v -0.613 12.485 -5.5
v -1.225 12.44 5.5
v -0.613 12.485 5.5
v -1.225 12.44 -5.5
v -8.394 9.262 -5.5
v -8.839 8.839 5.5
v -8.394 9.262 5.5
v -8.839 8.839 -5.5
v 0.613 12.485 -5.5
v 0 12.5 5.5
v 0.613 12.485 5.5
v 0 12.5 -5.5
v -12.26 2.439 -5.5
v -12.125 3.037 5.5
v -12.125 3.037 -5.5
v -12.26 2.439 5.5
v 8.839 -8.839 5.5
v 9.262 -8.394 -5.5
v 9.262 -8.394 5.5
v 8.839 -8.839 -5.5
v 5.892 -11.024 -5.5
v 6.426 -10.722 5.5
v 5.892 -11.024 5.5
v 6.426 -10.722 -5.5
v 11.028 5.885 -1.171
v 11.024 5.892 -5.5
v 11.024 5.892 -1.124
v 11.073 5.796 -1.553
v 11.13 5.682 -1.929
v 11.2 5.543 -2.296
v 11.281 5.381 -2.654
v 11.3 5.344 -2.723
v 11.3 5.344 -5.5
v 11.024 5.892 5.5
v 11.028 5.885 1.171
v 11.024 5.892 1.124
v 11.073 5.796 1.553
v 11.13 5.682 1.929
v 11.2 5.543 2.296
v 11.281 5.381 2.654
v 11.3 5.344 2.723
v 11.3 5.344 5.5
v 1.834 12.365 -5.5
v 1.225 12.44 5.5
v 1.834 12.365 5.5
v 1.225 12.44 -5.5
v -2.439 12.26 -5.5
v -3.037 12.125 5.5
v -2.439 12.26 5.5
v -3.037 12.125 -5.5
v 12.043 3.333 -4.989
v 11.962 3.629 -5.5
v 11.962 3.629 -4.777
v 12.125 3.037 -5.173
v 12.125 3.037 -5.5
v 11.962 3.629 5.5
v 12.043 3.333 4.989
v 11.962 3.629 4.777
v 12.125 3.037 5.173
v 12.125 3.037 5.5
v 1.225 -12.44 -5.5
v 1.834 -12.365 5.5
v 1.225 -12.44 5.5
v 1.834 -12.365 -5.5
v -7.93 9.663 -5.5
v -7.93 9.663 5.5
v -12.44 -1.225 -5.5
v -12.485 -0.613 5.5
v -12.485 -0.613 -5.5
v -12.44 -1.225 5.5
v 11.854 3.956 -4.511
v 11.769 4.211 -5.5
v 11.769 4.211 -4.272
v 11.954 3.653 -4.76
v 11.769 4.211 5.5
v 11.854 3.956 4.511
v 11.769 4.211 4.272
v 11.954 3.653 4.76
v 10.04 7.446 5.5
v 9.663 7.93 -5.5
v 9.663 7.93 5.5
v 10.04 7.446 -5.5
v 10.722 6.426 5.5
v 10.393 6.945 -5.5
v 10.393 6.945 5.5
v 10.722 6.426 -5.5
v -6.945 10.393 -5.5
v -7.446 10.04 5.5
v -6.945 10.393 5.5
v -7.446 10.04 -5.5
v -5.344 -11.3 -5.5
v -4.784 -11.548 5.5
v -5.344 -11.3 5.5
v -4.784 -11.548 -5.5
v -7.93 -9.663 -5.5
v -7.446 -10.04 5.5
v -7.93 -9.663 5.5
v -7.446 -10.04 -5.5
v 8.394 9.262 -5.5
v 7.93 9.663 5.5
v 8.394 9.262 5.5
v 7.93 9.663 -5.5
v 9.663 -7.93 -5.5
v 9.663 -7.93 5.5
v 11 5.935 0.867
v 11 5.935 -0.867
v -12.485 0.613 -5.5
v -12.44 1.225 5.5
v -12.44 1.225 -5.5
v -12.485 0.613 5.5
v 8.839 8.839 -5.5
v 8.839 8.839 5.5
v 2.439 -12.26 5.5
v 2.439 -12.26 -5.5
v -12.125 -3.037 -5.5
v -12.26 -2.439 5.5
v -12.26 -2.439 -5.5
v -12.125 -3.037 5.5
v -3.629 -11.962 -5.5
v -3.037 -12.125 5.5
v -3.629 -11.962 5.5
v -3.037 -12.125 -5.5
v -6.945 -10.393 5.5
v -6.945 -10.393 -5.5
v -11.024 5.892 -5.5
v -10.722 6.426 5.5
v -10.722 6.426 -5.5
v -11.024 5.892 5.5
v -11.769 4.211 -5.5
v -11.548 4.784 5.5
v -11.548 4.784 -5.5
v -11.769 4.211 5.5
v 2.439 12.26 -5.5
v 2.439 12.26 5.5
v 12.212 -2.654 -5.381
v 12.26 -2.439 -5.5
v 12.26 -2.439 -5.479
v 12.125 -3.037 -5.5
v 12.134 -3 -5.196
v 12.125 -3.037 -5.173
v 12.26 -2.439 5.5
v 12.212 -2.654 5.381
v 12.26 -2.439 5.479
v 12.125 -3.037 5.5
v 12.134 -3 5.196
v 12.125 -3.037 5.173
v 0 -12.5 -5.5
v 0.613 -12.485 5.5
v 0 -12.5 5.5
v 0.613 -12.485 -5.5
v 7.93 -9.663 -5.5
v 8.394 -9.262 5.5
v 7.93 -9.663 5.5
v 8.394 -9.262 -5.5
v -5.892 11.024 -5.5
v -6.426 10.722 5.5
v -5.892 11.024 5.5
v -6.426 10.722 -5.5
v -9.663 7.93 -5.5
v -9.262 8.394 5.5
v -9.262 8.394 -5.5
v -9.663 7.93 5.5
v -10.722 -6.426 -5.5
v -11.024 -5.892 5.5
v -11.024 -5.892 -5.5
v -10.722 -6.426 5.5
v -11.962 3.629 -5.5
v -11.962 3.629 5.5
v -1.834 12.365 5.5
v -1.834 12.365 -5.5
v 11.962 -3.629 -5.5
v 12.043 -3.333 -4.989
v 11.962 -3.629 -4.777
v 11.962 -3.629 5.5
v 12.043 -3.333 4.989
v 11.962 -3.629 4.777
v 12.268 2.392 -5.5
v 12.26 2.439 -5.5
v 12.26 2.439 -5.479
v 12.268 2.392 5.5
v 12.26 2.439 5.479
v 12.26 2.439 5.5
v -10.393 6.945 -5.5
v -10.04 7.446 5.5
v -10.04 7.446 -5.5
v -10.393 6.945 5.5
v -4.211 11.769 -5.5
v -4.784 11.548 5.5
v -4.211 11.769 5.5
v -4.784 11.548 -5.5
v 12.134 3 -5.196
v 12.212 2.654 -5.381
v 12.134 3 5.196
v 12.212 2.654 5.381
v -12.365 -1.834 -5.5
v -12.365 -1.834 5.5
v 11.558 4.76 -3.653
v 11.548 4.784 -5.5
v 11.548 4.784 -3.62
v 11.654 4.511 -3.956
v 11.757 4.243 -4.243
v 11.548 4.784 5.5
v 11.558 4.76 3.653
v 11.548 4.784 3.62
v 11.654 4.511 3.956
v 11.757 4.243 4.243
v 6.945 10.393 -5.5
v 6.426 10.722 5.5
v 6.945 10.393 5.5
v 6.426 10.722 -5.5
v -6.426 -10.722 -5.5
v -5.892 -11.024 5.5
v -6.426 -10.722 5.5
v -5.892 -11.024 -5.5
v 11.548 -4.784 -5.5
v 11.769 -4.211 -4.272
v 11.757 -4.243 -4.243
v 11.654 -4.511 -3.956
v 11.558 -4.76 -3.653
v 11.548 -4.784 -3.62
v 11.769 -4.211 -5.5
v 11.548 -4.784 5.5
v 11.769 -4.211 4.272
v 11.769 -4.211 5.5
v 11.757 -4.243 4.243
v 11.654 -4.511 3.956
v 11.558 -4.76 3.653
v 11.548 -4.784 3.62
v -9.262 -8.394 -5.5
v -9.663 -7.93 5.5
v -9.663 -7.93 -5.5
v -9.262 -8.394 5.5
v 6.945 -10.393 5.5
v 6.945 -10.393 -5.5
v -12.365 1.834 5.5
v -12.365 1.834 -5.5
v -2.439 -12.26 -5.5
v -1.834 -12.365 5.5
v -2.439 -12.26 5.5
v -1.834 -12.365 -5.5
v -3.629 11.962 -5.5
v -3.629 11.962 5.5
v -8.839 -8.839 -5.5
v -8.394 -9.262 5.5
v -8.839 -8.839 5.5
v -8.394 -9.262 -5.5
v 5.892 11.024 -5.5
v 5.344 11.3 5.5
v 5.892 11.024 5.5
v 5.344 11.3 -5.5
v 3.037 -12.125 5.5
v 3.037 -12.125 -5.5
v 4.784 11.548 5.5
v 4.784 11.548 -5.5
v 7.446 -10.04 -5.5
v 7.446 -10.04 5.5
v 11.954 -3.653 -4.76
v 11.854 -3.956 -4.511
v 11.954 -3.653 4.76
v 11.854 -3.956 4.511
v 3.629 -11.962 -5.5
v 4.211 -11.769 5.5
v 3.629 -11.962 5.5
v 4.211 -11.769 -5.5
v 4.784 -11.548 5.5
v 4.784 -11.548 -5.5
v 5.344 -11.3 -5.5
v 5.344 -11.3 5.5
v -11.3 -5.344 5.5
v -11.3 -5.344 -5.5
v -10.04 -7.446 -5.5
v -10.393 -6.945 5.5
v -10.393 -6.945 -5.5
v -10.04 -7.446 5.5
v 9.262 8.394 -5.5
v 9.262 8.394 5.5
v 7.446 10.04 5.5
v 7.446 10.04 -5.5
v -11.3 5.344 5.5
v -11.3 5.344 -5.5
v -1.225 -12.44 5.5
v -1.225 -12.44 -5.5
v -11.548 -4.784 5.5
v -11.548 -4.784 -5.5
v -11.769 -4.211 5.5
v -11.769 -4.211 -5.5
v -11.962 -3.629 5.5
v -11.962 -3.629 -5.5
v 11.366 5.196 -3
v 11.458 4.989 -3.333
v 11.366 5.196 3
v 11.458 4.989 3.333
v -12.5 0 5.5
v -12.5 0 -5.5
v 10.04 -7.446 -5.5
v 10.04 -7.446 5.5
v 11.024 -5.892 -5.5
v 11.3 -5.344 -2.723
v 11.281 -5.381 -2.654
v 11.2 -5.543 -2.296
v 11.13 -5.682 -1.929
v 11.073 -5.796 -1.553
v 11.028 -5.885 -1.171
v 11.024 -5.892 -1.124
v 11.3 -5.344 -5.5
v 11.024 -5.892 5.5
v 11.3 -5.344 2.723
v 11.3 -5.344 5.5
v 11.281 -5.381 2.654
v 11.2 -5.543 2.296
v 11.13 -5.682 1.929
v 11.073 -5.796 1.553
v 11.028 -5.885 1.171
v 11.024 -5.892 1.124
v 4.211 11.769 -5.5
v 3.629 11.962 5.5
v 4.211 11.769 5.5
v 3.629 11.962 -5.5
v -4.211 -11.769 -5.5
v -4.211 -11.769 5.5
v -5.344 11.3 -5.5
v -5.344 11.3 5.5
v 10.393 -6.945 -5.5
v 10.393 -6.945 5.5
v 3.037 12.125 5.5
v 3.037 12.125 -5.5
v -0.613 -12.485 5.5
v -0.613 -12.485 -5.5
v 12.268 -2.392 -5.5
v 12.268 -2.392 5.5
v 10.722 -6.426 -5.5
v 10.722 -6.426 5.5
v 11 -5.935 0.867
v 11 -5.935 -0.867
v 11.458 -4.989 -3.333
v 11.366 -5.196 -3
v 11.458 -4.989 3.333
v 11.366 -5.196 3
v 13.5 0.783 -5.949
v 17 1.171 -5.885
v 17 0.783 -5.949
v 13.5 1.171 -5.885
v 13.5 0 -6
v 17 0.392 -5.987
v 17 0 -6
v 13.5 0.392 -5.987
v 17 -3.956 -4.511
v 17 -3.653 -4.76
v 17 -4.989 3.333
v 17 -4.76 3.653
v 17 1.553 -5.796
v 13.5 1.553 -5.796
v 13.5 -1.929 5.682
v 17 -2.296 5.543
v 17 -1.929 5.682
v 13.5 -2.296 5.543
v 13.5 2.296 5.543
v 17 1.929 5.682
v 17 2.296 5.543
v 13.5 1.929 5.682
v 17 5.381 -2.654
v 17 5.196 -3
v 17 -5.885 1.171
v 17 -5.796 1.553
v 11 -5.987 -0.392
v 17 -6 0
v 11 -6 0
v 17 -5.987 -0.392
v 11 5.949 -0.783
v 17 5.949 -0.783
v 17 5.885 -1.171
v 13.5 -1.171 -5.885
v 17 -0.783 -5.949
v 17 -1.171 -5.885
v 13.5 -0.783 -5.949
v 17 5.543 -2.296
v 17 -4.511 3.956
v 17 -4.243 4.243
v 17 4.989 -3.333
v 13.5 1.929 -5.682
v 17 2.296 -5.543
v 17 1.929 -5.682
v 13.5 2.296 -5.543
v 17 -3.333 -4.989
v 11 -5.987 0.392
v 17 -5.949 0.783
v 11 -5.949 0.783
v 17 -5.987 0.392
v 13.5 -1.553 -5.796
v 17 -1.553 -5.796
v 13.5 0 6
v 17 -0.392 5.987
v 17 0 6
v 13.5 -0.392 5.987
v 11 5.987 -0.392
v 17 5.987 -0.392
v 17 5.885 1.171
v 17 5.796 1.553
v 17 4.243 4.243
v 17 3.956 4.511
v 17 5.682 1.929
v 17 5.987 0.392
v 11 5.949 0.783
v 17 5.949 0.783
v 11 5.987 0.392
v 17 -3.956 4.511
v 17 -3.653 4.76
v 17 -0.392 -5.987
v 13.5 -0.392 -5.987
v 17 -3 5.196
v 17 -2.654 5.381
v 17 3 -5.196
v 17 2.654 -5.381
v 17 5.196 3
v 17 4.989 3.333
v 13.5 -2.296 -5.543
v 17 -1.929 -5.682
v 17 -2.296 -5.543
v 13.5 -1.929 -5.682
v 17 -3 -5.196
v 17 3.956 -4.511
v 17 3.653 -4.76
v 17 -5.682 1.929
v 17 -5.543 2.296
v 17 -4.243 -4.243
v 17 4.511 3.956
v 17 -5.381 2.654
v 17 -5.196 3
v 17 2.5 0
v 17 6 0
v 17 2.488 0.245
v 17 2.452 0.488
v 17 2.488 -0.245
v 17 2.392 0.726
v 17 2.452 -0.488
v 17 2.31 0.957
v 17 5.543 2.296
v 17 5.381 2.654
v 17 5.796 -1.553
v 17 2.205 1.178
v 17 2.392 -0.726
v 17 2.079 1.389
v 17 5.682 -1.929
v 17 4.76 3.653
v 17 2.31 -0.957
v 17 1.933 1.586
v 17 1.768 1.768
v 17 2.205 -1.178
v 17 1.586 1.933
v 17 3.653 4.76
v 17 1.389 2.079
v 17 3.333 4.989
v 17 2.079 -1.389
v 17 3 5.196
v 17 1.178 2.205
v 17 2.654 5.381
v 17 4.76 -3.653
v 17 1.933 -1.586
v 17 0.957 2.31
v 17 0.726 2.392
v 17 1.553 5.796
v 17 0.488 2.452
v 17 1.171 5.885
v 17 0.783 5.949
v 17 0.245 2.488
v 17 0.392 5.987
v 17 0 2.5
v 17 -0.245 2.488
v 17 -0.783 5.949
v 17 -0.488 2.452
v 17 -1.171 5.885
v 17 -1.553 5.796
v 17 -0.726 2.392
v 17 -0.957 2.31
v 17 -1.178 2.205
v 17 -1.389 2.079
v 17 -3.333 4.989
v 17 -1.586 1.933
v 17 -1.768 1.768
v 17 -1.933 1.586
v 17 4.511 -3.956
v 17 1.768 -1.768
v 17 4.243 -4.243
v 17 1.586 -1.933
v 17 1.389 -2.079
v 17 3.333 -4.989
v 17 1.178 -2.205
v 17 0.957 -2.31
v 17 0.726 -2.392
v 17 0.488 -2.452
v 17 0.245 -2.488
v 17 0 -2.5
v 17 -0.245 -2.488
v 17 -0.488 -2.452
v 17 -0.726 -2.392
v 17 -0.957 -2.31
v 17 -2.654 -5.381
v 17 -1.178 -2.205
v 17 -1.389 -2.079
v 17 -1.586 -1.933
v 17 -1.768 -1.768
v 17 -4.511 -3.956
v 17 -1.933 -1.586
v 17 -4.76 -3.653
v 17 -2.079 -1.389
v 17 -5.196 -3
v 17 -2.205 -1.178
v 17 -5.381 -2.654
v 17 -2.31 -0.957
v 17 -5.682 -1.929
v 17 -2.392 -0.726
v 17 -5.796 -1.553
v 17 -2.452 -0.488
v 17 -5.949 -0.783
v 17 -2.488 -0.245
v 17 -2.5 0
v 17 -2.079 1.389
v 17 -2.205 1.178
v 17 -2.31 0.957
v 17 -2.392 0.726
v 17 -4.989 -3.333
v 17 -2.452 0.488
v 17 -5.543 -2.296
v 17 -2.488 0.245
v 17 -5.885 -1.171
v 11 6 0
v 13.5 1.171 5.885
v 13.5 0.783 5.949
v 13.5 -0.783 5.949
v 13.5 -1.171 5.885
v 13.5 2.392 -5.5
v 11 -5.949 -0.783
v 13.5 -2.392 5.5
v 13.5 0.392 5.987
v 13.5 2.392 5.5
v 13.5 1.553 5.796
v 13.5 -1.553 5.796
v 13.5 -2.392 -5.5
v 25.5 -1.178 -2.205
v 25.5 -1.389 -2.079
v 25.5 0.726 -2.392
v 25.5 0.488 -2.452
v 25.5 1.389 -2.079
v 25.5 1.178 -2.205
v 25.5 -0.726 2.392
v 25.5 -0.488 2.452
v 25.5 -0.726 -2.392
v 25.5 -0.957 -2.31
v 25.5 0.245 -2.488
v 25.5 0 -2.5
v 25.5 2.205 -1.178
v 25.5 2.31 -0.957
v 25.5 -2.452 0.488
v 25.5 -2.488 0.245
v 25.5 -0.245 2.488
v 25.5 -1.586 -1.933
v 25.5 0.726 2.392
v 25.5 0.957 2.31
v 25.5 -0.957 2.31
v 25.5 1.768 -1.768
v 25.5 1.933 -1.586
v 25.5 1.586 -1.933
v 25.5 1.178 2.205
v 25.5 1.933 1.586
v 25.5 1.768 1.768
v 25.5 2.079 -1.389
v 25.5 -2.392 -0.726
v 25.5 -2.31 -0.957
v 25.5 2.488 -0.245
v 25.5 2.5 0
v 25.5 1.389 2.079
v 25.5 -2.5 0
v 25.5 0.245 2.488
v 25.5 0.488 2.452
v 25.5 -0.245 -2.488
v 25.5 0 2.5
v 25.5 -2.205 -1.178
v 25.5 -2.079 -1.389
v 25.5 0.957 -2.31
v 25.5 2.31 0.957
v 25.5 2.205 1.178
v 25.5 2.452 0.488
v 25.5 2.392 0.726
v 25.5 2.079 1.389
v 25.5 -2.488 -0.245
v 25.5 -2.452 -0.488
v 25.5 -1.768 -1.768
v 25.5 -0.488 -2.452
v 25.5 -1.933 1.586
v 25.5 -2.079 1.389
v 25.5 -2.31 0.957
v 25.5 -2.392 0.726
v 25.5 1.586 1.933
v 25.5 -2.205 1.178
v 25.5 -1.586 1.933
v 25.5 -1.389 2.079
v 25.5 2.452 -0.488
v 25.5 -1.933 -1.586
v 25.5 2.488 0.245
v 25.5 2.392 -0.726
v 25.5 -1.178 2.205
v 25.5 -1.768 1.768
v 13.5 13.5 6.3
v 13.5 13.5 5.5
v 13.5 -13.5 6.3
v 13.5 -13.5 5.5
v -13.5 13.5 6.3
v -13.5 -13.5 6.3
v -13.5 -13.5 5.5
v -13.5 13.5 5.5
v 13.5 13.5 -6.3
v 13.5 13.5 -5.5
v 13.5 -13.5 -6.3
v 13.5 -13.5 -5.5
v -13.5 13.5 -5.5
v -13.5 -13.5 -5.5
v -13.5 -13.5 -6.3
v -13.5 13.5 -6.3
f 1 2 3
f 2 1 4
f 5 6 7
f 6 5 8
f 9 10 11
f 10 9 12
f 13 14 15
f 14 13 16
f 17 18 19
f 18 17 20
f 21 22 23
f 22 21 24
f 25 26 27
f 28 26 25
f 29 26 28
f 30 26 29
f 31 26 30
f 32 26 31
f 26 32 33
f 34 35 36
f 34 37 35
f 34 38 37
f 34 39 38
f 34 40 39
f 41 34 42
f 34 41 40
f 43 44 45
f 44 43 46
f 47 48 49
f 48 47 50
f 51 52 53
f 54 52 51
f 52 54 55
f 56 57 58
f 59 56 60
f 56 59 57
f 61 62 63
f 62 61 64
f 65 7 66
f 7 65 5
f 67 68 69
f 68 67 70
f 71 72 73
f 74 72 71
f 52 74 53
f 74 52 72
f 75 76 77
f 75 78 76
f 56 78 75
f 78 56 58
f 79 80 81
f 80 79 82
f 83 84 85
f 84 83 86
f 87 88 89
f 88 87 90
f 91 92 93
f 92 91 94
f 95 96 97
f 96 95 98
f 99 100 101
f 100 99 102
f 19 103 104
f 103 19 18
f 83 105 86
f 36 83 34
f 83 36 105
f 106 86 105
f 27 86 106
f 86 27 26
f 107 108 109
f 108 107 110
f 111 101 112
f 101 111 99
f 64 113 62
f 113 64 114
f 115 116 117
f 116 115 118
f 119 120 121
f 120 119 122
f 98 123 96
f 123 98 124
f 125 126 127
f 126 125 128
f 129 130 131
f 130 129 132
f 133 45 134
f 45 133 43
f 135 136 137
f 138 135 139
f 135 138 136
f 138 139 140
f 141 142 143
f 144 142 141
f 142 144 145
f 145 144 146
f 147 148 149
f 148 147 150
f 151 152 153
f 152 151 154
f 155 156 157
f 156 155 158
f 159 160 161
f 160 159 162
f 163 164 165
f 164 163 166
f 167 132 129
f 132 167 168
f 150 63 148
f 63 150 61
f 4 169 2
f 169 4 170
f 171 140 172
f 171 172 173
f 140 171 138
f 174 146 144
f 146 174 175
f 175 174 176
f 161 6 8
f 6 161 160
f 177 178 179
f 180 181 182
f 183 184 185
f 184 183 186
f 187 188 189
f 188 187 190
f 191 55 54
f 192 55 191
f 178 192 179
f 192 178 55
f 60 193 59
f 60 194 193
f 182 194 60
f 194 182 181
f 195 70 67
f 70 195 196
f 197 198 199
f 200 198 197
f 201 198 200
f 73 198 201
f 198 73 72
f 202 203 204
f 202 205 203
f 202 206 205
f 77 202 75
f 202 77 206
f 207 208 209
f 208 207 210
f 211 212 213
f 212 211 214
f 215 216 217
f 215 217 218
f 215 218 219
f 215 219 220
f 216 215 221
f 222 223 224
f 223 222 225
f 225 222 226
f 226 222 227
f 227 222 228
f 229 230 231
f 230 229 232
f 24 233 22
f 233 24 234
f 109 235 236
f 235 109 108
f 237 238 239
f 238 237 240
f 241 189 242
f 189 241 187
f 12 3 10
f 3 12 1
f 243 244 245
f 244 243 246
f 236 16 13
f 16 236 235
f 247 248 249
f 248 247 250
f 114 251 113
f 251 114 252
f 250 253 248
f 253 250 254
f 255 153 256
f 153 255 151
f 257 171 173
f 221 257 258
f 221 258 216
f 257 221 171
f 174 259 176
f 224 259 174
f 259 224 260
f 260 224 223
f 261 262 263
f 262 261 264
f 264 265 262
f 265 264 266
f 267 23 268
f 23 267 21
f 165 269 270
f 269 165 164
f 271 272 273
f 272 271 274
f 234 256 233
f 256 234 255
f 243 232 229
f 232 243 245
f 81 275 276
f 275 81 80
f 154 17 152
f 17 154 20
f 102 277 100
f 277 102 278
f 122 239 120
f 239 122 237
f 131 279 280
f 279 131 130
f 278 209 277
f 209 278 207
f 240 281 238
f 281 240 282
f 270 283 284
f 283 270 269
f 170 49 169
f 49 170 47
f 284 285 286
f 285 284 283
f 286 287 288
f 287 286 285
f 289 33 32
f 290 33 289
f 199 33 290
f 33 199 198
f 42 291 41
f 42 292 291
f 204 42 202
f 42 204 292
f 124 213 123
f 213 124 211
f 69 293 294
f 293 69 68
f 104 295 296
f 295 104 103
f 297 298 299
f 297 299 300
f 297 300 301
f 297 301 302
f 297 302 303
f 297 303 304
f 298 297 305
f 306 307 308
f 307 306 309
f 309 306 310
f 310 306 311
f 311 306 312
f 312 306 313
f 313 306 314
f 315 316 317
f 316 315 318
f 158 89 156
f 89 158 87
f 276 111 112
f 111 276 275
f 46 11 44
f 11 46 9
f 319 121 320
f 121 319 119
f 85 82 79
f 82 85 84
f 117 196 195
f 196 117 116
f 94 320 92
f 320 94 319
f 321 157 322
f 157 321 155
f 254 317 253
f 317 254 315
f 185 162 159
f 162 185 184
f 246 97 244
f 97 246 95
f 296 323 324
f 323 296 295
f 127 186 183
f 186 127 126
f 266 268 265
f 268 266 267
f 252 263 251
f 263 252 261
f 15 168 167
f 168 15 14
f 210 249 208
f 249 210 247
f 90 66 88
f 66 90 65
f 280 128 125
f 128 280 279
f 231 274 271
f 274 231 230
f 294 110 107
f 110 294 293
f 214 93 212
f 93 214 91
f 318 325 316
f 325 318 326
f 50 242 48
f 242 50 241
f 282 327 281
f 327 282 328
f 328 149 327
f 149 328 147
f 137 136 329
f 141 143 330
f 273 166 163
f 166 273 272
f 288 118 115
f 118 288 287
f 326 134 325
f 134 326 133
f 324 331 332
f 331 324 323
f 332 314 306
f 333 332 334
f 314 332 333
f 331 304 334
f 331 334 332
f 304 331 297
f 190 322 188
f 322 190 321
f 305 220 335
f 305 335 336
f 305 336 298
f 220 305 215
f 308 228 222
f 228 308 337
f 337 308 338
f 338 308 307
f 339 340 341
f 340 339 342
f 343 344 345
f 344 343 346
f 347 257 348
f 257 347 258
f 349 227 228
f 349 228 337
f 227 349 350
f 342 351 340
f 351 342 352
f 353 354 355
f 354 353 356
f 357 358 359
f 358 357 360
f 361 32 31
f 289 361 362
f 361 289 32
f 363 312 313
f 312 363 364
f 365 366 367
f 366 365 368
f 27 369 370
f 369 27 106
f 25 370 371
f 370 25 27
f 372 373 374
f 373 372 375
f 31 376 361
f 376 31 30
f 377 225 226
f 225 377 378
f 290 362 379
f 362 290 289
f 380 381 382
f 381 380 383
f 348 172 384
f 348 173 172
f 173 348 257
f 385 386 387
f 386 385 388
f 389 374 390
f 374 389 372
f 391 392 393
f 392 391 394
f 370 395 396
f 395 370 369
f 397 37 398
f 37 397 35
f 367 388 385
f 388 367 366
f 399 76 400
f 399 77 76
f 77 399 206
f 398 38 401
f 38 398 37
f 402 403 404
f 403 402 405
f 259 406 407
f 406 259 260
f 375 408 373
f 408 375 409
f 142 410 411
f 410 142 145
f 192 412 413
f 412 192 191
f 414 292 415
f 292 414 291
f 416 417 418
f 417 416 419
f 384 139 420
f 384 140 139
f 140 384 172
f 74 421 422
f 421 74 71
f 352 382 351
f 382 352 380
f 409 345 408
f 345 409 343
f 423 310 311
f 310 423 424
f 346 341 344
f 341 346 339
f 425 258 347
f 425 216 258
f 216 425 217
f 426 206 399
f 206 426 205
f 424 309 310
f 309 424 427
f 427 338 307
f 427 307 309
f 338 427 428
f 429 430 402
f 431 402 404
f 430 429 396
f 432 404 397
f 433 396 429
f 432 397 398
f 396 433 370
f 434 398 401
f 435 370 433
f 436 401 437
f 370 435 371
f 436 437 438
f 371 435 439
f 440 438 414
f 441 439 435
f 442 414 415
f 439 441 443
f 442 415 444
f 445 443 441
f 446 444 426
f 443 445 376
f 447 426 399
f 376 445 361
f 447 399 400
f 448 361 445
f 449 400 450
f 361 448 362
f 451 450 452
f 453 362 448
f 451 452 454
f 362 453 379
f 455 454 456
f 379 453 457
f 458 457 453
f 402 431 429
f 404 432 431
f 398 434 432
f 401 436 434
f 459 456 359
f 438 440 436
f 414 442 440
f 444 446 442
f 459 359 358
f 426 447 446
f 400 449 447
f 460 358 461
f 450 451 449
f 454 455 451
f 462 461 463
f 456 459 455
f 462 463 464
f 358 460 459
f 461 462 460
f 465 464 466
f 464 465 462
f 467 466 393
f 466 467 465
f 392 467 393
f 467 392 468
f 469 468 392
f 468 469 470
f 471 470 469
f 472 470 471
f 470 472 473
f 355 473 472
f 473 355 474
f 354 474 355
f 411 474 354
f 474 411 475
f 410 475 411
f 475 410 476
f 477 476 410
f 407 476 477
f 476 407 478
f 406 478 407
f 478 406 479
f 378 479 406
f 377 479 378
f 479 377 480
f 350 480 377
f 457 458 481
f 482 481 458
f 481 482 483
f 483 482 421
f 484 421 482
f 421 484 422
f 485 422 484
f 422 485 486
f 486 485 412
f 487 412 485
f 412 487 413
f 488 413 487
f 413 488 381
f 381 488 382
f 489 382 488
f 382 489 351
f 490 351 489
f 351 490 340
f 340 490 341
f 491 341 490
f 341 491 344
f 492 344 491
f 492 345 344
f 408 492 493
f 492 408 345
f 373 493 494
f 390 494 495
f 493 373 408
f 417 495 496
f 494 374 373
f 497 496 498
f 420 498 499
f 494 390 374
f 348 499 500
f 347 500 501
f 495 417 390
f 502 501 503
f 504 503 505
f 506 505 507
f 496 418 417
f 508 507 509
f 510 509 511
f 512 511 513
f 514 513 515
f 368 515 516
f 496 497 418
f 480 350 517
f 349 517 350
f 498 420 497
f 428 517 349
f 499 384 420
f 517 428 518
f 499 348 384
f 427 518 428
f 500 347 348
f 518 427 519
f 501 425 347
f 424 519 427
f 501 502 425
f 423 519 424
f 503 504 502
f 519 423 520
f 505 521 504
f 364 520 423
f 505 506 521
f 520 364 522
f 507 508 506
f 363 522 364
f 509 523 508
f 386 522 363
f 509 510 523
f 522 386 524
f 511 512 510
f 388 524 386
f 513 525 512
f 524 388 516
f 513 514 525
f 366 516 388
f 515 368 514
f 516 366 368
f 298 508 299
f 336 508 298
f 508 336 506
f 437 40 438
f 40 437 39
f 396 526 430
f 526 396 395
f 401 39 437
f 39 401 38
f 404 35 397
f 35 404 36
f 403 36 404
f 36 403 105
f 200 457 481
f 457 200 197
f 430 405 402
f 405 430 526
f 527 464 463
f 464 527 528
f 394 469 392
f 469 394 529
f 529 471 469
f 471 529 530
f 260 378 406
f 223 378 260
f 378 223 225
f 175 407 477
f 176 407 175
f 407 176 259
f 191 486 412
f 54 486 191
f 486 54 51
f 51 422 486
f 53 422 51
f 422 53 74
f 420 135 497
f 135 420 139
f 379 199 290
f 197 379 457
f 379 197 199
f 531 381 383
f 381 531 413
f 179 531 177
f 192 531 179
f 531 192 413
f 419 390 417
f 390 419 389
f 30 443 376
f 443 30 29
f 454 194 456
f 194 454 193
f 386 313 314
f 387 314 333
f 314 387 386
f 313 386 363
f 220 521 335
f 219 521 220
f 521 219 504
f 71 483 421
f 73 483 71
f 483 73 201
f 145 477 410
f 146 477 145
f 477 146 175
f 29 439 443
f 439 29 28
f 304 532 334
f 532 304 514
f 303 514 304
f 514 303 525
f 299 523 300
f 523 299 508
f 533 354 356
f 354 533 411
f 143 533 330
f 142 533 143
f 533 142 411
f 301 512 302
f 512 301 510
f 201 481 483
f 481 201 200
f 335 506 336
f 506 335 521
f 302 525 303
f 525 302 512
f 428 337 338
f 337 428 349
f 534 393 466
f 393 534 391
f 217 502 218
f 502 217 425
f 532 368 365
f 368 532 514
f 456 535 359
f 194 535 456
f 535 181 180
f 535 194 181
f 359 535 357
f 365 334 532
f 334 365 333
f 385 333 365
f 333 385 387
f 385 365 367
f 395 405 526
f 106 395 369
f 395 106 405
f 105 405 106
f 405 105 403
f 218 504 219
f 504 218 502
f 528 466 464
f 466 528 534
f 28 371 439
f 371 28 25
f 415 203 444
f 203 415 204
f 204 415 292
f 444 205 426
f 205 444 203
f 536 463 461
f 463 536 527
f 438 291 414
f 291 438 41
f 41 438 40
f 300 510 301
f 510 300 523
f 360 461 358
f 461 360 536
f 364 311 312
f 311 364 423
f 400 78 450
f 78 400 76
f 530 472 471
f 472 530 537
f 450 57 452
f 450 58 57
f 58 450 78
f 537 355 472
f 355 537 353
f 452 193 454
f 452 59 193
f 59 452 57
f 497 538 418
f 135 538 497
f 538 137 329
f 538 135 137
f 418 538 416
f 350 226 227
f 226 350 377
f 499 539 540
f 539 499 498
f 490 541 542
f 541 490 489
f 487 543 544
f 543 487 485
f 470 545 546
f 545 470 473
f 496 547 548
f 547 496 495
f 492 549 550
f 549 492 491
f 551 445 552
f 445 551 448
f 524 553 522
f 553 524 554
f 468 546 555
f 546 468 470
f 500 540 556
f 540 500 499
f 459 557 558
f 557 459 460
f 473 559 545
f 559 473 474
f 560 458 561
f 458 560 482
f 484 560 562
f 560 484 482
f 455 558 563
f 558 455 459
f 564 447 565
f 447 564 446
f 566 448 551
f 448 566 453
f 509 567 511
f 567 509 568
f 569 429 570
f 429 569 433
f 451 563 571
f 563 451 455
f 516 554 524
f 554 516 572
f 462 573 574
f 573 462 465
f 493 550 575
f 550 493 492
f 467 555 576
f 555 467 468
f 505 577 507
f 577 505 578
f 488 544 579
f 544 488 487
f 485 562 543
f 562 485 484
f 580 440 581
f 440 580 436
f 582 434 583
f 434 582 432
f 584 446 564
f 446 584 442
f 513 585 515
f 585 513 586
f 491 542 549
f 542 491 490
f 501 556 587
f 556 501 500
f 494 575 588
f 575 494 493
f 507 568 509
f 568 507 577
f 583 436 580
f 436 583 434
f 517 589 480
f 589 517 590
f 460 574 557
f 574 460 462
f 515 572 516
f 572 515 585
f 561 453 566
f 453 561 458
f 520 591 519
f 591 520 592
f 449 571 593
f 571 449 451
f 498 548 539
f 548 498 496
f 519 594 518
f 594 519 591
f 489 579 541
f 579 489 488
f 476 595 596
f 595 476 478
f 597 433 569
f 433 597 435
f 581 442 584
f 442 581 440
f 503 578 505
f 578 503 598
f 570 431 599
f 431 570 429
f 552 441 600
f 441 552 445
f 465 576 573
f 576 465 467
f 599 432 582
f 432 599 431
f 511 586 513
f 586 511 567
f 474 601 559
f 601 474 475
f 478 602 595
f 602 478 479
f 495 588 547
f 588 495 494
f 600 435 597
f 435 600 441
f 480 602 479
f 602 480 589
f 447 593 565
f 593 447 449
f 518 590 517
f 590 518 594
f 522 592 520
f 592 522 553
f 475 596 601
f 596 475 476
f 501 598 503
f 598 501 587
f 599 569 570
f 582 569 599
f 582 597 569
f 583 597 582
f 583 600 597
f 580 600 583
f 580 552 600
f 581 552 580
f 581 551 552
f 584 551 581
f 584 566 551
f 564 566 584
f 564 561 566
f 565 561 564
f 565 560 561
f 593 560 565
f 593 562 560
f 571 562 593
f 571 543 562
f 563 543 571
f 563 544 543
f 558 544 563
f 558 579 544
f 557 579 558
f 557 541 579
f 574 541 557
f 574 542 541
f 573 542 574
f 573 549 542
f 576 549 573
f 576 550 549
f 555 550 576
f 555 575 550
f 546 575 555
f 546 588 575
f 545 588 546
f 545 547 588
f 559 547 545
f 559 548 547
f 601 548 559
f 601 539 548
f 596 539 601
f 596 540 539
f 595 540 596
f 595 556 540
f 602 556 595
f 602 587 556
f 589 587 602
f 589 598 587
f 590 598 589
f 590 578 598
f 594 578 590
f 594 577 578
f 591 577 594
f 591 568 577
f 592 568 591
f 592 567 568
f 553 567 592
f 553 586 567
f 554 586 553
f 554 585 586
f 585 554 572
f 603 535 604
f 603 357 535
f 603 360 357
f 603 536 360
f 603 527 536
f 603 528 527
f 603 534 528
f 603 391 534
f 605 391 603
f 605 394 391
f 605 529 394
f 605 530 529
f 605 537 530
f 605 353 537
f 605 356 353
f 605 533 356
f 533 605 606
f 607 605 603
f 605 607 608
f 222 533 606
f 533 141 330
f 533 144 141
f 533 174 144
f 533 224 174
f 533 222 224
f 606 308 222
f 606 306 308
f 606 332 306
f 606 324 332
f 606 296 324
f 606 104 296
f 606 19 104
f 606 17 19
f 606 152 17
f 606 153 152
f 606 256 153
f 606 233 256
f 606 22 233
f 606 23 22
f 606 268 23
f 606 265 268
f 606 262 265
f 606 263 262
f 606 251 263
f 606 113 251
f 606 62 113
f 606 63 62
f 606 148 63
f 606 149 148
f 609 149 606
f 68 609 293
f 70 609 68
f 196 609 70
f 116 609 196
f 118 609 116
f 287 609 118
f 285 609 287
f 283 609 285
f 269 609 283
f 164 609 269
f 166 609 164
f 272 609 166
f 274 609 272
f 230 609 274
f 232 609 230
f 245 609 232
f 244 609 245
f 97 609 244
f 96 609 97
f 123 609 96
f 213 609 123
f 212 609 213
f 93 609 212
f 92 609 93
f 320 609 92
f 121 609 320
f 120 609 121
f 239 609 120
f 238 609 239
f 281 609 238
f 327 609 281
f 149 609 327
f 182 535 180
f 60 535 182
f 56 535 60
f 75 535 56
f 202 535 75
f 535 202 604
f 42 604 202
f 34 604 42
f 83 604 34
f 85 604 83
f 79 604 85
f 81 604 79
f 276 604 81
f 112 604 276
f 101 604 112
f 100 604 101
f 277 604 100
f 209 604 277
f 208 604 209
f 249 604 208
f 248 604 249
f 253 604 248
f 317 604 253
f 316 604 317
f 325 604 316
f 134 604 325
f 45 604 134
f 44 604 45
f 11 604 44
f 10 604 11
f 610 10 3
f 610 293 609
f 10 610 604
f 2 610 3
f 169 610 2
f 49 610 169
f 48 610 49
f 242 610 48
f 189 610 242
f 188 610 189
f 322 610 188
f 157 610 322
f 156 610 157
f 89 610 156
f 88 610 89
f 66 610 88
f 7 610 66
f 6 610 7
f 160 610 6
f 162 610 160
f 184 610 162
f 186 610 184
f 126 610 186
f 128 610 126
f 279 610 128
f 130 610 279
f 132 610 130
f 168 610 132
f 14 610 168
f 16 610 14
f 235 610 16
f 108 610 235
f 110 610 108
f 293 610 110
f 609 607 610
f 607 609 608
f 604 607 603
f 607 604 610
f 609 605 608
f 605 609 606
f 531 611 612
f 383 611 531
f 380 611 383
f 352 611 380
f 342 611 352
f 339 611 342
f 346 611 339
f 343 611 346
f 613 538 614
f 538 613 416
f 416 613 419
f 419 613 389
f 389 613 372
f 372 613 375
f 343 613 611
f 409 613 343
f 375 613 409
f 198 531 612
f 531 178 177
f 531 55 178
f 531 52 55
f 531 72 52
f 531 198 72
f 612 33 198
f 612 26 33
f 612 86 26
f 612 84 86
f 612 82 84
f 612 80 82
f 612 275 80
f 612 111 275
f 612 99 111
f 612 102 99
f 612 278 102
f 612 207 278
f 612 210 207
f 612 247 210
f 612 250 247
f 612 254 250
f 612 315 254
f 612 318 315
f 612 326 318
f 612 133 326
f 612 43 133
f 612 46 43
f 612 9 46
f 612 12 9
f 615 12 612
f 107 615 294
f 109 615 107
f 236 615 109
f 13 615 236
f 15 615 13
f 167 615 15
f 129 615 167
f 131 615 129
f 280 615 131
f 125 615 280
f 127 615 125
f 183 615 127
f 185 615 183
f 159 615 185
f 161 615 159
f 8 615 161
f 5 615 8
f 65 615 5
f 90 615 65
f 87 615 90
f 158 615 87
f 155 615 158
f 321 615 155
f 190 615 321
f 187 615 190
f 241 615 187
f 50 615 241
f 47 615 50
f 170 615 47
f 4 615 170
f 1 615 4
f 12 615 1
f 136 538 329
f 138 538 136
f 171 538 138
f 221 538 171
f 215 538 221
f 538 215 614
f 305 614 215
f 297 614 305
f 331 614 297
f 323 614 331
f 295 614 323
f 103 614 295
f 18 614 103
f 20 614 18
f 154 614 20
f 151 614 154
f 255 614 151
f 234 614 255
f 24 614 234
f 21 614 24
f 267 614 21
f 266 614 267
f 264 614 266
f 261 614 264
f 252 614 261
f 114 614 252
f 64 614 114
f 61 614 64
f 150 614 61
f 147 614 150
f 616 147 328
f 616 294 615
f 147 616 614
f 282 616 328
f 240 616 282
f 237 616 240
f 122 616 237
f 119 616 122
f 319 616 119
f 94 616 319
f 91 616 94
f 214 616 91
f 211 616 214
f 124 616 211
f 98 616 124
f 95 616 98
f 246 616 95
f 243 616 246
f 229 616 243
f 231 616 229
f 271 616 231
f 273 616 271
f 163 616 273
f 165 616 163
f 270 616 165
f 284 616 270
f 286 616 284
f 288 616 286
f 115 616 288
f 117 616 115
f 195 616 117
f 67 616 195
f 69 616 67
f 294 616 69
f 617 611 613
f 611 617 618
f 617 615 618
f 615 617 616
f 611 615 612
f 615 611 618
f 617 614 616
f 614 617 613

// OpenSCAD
// Parameters
stator_diameter_mm = 23.0; //[12.0:46.0:0.1]
stator_height_mm   = 12.0; //[6.0:24.0:0.1]
center_bore_diameter_mm = 5.0; //[2.5:10.0:0.1]
tolerance_mm = 0.2; //[0.0:1.0:0.05]

ref_plane_thickness_mm = 0.8; //[0.4:2.0:0.1]
ref_plane_margin_mm    = 2.0; //[1.0:6.0:0.1]
ref_plane_offset_mm    = 0.5; //[0.2:2.0:0.1]

// Structural overlap to guarantee attachment (1-2mm as required)
attach_overlap_mm = 1.5;

// --- BLDC motor details (added missing part) ---
motor_can_extra_d_mm = 2.0;                 // motor can slightly larger than stator
motor_can_diameter_mm = stator_diameter_mm + motor_can_extra_d_mm;
motor_can_height_mm   = stator_height_mm;   // keep overall design consistent

endcap_thickness_mm = 1.2;                  // thin endcaps
shaft_diameter_mm   = 5.0;                  // typical small BLDC shaft
shaft_length_mm     = 10.0;                 // protrusion length
hub_diameter_mm     = 12.0;                 // "gold cylindrical part" (rotor hub)
hub_length_mm       = 6.0;                  // hub length

// Stator core with center bore
module stator_core() {
  color("DimGray")
  difference() {
    cylinder(r=stator_diameter_mm/2, h=stator_height_mm, center=true, $fn=96);
    cylinder(r=center_bore_diameter_mm/2, h=stator_height_mm + 2*tolerance_mm, center=true, $fn=96);
  }
}

// Motor can (outer shell) + endcaps (kept simple, physically connected)
module motor_can() {
  color([0.35, 0.35, 0.35])
  union() {
    // Outer can
    cylinder(r=motor_can_diameter_mm/2, h=motor_can_height_mm, center=true, $fn=128);

    // Front endcap (slight overlap into can)
    translate([0, 0, motor_can_height_mm/2 - endcap_thickness_mm/2 - attach_overlap_mm/2])
      cylinder(r=motor_can_diameter_mm/2, h=endcap_thickness_mm + attach_overlap_mm, center=true, $fn=128);

    // Rear endcap (slight overlap into can)
    translate([0, 0, -motor_can_height_mm/2 + endcap_thickness_mm/2 + attach_overlap_mm/2])
      cylinder(r=motor_can_diameter_mm/2, h=endcap_thickness_mm + attach_overlap_mm, center=true, $fn=128);
  }
}

// Gold rotor hub + shaft (FIXED: attached to motor body with guaranteed overlap; no gap/floating)
module rotor_hub_and_shaft() {
  // Place hub on +X side of motor can.
  // Motor can outer radius:
  can_r = motor_can_diameter_mm/2;

  // Hub is centered so its inner face penetrates the can by attach_overlap_mm.
  // Inner face x = hub_center_x - hub_length/2
  // Want inner face = can_r - attach_overlap_mm
  hub_center_x = can_r - attach_overlap_mm + hub_length_mm/2;

  // Shaft continues outward from hub, overlapping into hub by attach_overlap_mm.
  // Hub outer face x = hub_center_x + hub_length/2
  hub_outer_face_x = hub_center_x + hub_length_mm/2;
  shaft_center_x = hub_outer_face_x + shaft_length_mm/2 - attach_overlap_mm;

  color([0.8, 0.6, 0.2])  // gold/brass
  union() {
    // Rotor hub (gold cylindrical part) - now intersects motor can by attach_overlap_mm
    translate([hub_center_x, 0, 0])
      rotate([0, 90, 0])
        cylinder(r=hub_diameter_mm/2, h=hub_length_mm, center=true, $fn=96);

    // Shaft - overlaps into hub by attach_overlap_mm
    translate([shaft_center_x, 0, 0])
      rotate([0, 90, 0])
        cylinder(r=shaft_diameter_mm/2, h=shaft_length_mm, center=true, $fn=64);
  }
}

// Mounting face reference planes (kept as in original design)
module ref_planes() {
  color("Silver")
  union() {
    translate([0, 0,  stator_height_mm/2 + ref_plane_thickness_mm/2 - ref_plane_offset_mm])
      cube([stator_diameter_mm + 2*ref_plane_margin_mm,
            stator_diameter_mm + 2*ref_plane_margin_mm,
            ref_plane_thickness_mm], center=true);

    translate([0, 0, -stator_height_mm/2 - ref_plane_thickness_mm/2 + ref_plane_offset_mm])
      cube([stator_diameter_mm + 2*ref_plane_margin_mm,
            stator_diameter_mm + 2*ref_plane_margin_mm,
            ref_plane_thickness_mm], center=true);
  }
}

// BLDC motor assembly (added missing part; all connected via union with overlaps)
module bldc_motor() {
  union() {
    // Core stator (with bore)
    stator_core();

    // Outer can overlaps stator slightly to ensure a single connected solid
    // (stator radius is smaller; can encloses it, so they intersect by volume)
    motor_can();

    // Rotor hub + shaft attached to can (fixed gap/floating)
    rotor_hub_and_shaft();

    // Reference planes (intersect motor body by design)
    ref_planes();
  }
}

// Final assembly: single connected solid via union()
union() {
  bldc_motor();
}
